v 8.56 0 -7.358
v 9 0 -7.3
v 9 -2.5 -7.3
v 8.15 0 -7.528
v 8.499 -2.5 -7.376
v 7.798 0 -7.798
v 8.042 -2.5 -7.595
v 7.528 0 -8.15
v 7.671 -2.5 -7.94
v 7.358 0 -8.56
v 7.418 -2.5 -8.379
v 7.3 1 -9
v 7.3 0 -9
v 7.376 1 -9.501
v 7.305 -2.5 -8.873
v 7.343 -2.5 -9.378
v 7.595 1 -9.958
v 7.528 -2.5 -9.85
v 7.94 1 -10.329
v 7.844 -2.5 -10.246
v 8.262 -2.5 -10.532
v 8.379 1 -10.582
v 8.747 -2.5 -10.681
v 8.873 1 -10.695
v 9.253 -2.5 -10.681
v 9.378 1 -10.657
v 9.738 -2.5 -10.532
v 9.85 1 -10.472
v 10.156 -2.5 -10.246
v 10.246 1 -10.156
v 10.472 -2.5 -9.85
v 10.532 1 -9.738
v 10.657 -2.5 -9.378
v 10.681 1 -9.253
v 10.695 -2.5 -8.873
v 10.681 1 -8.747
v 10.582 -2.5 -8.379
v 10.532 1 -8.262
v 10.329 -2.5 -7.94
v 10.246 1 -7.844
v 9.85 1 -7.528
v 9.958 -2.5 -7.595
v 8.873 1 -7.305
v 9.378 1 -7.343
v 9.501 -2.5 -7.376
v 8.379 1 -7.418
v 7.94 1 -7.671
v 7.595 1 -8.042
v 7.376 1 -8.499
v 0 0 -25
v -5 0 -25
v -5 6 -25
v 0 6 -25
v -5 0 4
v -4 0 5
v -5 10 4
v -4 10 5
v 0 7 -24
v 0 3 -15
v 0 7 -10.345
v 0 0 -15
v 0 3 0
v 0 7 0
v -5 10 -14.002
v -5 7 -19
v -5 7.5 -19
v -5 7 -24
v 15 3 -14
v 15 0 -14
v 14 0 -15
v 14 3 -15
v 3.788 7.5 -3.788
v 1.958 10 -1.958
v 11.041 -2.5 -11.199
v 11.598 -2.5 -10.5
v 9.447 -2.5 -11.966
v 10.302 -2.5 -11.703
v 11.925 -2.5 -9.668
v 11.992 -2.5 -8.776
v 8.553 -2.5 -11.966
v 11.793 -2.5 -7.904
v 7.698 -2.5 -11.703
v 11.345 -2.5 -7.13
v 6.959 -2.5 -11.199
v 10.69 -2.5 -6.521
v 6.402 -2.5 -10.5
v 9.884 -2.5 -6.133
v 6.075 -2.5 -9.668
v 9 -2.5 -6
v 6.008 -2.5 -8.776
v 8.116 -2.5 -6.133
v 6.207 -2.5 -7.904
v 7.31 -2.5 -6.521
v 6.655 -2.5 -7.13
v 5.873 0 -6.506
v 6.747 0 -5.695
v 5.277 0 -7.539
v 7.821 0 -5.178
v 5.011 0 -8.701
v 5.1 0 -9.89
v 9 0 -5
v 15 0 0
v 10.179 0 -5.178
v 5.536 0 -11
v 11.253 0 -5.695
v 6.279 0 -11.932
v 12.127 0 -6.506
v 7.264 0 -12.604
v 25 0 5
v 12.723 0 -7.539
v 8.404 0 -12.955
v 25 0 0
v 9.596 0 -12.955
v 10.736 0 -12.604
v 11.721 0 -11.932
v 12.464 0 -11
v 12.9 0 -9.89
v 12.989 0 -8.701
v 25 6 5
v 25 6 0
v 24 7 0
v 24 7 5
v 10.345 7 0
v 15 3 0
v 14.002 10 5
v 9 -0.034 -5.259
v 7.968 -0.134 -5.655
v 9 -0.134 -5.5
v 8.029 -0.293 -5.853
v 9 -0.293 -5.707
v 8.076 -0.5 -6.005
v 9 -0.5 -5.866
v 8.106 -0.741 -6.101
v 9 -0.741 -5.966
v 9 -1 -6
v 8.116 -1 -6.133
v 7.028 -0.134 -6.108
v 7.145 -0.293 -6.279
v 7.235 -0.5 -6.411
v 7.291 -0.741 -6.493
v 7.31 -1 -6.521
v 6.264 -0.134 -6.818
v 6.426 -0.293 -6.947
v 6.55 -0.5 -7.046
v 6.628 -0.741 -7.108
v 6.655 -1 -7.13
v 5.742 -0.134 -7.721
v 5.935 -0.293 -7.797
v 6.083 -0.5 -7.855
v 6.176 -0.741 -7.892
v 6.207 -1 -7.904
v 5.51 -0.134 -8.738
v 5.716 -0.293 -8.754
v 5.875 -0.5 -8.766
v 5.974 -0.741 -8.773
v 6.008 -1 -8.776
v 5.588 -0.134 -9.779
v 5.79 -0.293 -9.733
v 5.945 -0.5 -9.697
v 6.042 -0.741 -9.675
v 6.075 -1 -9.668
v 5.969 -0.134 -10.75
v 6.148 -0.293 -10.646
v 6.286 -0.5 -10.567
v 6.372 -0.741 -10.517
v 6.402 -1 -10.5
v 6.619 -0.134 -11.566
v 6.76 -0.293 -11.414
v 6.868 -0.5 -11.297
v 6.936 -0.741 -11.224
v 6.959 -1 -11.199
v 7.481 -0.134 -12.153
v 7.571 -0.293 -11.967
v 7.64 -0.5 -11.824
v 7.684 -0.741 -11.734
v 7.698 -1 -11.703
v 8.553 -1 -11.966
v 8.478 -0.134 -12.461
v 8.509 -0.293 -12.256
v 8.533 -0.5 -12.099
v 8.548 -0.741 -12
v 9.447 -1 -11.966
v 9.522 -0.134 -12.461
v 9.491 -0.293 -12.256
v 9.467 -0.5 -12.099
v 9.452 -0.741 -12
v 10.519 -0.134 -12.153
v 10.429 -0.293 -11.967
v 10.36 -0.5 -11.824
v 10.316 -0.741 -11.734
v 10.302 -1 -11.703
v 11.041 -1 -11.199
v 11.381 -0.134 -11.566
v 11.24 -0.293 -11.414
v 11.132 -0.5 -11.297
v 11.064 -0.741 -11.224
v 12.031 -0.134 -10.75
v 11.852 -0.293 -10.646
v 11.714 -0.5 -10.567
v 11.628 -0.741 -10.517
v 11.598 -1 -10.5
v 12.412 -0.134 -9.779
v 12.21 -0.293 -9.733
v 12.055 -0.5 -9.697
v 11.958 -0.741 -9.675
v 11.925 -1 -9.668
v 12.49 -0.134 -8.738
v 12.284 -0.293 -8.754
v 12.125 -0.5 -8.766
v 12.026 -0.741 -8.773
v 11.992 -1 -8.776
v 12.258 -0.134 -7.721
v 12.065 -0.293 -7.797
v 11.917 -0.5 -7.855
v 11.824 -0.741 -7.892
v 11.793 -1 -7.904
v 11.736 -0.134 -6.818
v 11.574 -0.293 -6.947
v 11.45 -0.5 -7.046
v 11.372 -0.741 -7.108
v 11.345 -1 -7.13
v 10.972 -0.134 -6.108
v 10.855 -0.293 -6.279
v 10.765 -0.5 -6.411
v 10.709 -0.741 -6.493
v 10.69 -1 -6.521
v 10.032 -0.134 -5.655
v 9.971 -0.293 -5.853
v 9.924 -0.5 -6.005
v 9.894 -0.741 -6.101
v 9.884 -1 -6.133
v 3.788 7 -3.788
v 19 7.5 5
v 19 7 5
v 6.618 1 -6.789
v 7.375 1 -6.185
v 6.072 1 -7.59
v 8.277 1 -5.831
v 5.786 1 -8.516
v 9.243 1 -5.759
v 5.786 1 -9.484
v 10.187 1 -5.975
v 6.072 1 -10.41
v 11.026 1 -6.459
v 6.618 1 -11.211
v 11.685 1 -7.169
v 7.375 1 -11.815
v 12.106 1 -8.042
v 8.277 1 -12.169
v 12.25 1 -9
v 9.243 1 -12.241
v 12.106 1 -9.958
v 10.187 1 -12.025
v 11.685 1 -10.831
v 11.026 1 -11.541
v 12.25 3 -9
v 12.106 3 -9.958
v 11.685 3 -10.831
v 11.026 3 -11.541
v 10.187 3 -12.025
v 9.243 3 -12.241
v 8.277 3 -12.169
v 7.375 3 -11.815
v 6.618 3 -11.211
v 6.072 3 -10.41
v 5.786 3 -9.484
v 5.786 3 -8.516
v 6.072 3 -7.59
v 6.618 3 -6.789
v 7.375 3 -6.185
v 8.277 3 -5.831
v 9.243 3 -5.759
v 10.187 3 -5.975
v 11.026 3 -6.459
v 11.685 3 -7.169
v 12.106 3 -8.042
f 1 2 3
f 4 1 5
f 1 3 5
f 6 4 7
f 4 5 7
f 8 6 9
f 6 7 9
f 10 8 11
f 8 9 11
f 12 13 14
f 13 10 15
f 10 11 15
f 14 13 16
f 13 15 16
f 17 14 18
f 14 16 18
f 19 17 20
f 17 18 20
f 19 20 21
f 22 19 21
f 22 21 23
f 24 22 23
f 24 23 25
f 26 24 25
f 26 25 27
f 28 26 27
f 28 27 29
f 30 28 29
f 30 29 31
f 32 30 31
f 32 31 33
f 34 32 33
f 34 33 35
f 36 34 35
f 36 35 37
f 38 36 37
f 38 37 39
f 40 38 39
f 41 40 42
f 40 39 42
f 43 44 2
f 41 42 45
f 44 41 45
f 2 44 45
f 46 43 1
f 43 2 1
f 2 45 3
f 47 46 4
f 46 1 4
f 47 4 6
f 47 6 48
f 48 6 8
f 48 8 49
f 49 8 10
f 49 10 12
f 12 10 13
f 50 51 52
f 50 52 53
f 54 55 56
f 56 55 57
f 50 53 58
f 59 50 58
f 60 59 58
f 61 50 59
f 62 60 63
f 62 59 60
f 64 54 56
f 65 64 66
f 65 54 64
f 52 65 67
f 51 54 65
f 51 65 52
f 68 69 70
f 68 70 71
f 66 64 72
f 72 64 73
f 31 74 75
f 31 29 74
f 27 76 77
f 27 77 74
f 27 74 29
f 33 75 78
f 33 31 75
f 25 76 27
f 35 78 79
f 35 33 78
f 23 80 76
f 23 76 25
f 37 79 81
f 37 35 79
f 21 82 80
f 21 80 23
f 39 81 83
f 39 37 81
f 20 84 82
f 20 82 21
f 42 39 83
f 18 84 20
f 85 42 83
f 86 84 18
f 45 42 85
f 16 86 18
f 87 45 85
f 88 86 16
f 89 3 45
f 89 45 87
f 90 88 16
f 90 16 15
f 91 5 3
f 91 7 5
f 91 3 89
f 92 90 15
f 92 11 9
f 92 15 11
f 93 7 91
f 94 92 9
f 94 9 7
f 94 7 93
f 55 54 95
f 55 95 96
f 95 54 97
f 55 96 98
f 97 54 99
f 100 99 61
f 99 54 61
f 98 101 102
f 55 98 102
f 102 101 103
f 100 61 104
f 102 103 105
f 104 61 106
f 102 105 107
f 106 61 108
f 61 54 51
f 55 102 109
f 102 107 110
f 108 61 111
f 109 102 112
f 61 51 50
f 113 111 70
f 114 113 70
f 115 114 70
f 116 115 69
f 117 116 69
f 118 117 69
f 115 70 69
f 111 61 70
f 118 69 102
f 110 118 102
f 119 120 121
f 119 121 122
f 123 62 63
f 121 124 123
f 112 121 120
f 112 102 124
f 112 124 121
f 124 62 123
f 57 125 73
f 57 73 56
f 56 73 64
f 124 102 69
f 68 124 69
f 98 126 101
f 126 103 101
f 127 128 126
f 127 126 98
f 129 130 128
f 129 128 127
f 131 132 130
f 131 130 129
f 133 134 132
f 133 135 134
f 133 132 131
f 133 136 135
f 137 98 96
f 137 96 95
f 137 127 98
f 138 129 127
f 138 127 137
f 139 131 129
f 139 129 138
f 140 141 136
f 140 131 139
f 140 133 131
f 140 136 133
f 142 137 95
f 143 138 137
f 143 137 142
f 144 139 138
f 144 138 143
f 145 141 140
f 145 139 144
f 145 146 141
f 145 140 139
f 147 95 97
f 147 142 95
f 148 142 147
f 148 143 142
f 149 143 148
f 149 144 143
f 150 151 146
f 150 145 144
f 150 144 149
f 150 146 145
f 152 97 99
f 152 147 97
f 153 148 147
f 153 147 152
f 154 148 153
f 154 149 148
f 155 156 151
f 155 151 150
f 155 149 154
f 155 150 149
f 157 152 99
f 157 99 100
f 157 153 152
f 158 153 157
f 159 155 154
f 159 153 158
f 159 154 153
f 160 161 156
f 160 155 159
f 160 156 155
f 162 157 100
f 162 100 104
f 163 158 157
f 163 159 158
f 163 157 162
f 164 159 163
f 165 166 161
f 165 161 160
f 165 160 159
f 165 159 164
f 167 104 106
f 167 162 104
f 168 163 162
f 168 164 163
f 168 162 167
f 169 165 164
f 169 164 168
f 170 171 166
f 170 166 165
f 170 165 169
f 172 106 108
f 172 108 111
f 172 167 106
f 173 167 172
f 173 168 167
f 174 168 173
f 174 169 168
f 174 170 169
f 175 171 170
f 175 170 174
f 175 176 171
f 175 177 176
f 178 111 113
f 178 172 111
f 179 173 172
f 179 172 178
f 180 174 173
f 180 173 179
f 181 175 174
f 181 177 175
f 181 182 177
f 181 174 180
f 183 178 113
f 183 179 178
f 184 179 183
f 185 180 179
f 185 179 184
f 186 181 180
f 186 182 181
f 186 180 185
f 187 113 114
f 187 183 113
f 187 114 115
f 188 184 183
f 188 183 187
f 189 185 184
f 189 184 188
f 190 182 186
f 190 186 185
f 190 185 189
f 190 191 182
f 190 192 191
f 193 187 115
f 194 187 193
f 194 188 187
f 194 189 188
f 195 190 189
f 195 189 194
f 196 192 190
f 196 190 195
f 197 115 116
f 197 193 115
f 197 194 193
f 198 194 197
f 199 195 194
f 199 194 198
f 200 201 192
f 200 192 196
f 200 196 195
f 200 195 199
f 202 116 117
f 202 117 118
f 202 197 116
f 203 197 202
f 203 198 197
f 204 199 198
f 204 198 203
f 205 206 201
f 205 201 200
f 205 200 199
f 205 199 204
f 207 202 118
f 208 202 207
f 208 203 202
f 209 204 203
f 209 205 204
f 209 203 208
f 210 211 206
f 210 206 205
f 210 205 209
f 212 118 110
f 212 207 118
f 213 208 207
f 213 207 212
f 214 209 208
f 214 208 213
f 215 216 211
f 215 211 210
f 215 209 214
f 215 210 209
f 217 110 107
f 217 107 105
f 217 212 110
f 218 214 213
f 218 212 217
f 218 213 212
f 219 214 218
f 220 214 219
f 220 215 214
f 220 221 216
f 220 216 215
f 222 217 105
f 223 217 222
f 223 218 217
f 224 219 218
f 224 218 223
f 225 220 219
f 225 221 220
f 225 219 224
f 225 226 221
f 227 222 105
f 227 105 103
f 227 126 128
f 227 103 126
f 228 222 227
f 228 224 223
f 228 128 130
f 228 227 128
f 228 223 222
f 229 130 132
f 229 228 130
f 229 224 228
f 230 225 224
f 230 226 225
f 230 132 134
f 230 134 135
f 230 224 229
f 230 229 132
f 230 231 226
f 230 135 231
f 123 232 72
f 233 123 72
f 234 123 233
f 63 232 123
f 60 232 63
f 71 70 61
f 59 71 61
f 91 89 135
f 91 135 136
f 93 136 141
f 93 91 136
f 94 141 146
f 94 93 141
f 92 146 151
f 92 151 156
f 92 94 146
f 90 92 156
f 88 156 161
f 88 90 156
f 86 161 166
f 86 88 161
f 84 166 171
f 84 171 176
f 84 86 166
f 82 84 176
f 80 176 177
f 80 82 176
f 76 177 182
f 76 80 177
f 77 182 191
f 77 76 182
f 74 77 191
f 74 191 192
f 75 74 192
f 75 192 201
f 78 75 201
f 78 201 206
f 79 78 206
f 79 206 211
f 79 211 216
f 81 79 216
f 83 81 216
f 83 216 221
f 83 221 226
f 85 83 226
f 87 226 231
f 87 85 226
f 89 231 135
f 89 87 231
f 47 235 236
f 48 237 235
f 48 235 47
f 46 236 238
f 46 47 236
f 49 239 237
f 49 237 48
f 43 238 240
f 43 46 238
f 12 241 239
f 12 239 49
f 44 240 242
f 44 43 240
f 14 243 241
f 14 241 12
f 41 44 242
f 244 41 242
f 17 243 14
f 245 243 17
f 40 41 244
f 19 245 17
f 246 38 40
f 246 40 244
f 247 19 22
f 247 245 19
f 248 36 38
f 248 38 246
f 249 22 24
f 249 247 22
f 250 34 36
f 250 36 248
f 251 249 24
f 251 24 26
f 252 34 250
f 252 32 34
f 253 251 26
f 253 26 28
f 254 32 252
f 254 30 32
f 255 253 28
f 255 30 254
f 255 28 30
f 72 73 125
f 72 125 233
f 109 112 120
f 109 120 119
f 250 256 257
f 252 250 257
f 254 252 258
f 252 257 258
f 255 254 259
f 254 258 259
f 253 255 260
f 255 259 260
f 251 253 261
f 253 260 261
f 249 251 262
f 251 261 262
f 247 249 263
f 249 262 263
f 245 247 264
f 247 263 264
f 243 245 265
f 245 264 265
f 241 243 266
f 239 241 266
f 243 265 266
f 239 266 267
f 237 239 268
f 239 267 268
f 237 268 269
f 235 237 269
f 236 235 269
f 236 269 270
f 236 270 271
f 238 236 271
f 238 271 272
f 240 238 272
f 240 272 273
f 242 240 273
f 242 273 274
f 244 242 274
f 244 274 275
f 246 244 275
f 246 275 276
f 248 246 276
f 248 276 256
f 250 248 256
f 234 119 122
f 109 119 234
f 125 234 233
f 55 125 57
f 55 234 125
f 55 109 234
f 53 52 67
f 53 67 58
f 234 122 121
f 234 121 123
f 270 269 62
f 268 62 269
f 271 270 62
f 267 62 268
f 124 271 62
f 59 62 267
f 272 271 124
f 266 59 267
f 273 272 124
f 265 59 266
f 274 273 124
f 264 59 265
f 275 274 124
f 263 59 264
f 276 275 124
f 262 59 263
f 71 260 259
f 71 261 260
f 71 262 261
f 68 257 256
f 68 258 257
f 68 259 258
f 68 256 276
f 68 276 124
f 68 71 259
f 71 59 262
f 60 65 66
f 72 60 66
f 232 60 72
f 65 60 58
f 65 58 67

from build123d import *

# Parameters (mm, degrees)
BOSS_EXTRUDE1_DEPTH                                  = 3
BOSS_EXTRUDE2_DEPTH                                  = 4
REFRENTADO_PARA_TORNILLO_CON_CABEZA_PLAN_D           = 3.4
REFRENTADO_PARA_TORNILLO_CON_CABEZA_PLAN_DEPTH       = 40
REFRENTADO_PARA_TORNILLO_CON_CABEZA_PLAN_CBORE_D     = 6.5
REFRENTADO_PARA_TORNILLO_CON_CABEZA_PLAN_CBORE_DEPTH = 2
REFRENTADO_PARA_TORNILLO_CON_CABEZA_PLAN_TIP         = 1.021463052
BOSS_EXTRUDE3_START                                  = 2.5
SKETCH5_R                                            = 3
SKETCH5_R_2                                          = 1.7
BOSS_EXTRUDE3_DEPTH                                  = 2.5
BOSS_EXTRUDE4_DEPTH                                  = 3
CHAMFER1_SIZE                                        = 2.5
CHAMFER2_SIZE                                        = 1
FILLET2_R                                            = 1


with BuildPart() as part:
    # Sketch1 → Boss-Extrude1 (new body)
    with BuildSketch(Plane(origin=(0, 0, 0), x_dir=(1, 0, 0), z_dir=(0, 1, 0))):
        Polygon((0, 15), (0, 25), (-5, 25), (-5, -5), (25, -5), (25, 0), (15, 0), (15, 15), align=None)
    extrude(amount=BOSS_EXTRUDE1_DEPTH)

    # Sketch2 → Boss-Extrude2 (add)
    with BuildSketch(Plane(origin=(0, 3, 0), x_dir=(1, 0, 0), z_dir=(0, 1, 0))):
        Polygon((-5, 25), (0, 25), (0, 0), (25, 0), (25, -5), (-5, -5), align=None)
    extrude(amount=BOSS_EXTRUDE2_DEPTH)

    # Refrentado para tornillo con cabeza plana de M31
    with Locations(Plane(origin=(0, 3, 0), x_dir=(1, 0, 0), z_dir=(0, 1, 0))):
        with Locations((9, 9)):
            CounterBoreHole(REFRENTADO_PARA_TORNILLO_CON_CABEZA_PLAN_D / 2, REFRENTADO_PARA_TORNILLO_CON_CABEZA_PLAN_CBORE_D / 2, REFRENTADO_PARA_TORNILLO_CON_CABEZA_PLAN_CBORE_DEPTH, depth=REFRENTADO_PARA_TORNILLO_CON_CABEZA_PLAN_DEPTH)
            with Locations((0, 0, -(REFRENTADO_PARA_TORNILLO_CON_CABEZA_PLAN_DEPTH + REFRENTADO_PARA_TORNILLO_CON_CABEZA_PLAN_TIP / 2))):  # 118° drill point
                Cone(0, REFRENTADO_PARA_TORNILLO_CON_CABEZA_PLAN_D / 2, REFRENTADO_PARA_TORNILLO_CON_CABEZA_PLAN_TIP, mode=Mode.SUBTRACT)

    # Sketch5 → Boss-Extrude3 (add)
    with BuildSketch(Plane.XZ.offset(BOSS_EXTRUDE3_START)):
        with Locations(Location((9, -9, 0), (0, 0, 90))):
            Circle(SKETCH5_R)
        with Locations(Location((9, -9, 0), (0, 0, 90))):
            Circle(SKETCH5_R_2, mode=Mode.SUBTRACT)
    extrude(amount=-BOSS_EXTRUDE3_DEPTH)

    # Sketch6 → Boss-Extrude4 (add)
    with BuildSketch(Plane(origin=(0, 7, 0), x_dir=(1, 0, 0), z_dir=(0, 1, 0))):
        Polygon((-5, -5), (-5, 19), (3.788160363, 3.788160363), (19, -5), align=None)
    extrude(amount=BOSS_EXTRUDE4_DEPTH)

    # Chamfer1
    chamfer1_edges = [part.edges().sort_by_distance(p)[0] for p in [
        (11.394080181, 10, 0.605919819),
        (-0.605919819, 10, -11.394080181),
    ]]
    chamfer(chamfer1_edges, length=CHAMFER1_SIZE)

    # Chamfer2
    chamfer2_edges = [part.edges().sort_by_distance(p)[0] for p in [
        (15, 1.5, -15),
        (-5, 5, 5),
        (25, 7, 2.5),
        (-2.5, 7, -25),
    ]]
    chamfer(chamfer2_edges, length=CHAMFER2_SIZE)

    # Fillet2
    fillet2_edges = [part.edges().sort_by_distance(p)[0] for p in [
        (9, 0, -12),
    ]]
    fillet(fillet2_edges, radius=FILLET2_R)


solid = part.part
